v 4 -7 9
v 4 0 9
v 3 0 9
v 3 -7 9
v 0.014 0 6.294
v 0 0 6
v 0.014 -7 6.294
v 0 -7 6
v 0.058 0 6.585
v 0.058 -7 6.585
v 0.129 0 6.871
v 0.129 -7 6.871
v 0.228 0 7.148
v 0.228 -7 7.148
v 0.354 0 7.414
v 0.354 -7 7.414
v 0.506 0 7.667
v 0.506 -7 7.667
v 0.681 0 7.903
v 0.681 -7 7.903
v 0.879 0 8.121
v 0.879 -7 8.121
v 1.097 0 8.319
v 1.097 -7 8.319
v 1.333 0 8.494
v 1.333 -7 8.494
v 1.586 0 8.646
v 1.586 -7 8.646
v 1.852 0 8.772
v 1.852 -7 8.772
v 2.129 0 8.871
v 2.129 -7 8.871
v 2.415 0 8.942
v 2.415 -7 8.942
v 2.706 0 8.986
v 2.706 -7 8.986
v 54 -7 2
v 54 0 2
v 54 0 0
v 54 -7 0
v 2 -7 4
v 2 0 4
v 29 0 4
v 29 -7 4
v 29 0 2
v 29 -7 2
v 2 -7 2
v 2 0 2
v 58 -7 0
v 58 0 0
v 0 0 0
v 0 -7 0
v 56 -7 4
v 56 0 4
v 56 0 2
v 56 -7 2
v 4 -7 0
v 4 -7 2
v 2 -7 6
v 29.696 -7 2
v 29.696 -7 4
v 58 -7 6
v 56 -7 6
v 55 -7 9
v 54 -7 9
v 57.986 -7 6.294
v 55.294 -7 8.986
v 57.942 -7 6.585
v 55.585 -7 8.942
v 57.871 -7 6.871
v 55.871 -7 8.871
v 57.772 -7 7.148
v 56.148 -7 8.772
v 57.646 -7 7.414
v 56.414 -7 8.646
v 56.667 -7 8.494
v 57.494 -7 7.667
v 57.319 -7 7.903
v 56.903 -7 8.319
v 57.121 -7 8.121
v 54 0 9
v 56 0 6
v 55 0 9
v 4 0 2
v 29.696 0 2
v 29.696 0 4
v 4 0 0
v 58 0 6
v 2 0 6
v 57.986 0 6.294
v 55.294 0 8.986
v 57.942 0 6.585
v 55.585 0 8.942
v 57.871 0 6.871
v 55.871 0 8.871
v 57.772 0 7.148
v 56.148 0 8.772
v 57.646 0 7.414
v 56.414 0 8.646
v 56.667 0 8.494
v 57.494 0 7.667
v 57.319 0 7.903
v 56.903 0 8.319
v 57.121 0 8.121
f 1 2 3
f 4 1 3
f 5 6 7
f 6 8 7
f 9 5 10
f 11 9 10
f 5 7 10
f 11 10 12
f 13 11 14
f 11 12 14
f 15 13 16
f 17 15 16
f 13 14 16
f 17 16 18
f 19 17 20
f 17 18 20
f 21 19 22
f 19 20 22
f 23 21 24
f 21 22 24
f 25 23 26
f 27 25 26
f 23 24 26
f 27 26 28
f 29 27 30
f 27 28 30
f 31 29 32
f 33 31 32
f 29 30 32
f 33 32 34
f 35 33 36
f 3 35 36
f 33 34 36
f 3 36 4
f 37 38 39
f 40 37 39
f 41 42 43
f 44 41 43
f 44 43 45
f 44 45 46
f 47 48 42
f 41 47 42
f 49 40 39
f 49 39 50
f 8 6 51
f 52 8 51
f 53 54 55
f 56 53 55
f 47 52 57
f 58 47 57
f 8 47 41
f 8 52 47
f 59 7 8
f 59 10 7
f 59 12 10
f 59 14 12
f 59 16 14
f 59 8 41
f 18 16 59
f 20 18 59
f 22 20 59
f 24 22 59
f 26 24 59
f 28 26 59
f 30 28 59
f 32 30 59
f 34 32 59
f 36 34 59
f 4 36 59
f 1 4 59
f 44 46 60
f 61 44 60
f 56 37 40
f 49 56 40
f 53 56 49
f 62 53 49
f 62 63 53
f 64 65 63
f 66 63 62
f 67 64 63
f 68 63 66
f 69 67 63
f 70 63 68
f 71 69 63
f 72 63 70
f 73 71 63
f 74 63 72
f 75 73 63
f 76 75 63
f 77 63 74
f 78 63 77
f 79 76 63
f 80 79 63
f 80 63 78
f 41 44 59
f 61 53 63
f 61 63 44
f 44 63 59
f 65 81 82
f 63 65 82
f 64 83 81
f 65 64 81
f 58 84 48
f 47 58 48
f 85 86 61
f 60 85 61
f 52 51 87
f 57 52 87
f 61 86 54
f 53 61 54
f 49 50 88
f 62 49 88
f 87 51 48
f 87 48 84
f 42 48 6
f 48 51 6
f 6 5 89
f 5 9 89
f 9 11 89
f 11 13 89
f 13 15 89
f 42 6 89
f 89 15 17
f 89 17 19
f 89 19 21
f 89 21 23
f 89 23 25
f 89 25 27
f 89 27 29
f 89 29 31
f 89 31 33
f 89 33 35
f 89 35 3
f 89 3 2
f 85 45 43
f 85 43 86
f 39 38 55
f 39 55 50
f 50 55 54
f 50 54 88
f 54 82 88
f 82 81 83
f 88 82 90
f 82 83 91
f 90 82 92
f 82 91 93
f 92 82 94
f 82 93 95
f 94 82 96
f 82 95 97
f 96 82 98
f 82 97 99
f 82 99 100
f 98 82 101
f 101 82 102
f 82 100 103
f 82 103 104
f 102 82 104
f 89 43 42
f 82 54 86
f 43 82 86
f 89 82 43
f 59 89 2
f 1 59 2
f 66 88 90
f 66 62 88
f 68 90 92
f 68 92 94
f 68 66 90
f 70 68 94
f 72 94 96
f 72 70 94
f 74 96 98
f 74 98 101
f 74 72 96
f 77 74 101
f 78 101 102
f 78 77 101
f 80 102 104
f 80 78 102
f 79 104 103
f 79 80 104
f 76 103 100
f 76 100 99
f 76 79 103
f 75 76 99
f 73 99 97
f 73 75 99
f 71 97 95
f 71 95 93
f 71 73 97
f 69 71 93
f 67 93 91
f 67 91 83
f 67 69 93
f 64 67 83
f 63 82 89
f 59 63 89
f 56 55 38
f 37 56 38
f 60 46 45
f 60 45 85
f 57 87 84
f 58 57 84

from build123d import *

# Parameters (mm, degrees)
F1_DEPTH = 7
F2_R     = 3
F3_W     = 0.695917
F3_H     = 7
F4_DEPTH = 2


with BuildPart() as f1:
    # F0 (on Front) → F1 (new body)
    with BuildSketch(Plane.XZ):
        Polygon((0, 9), (0, 6), (2, 6), (4, 9), align=None)
        Polygon((2, 6), (0, 6), (0, 0), (4, 0), (4, 2), (2, 2), (2, 4), (56, 4), (56, 2), (54, 2), (54, 0), (58, 0), (58, 6), (56, 6), align=None)
        Polygon((54, 9), (56, 6), (58, 6), (58, 9), align=None)
    extrude(amount=F1_DEPTH)

    # F2
    f2_edges = [f1.edges().sort_by_distance(p)[0] for p in [
        (0, -3.5, 9),
        (58, -3.5, 9),
    ]]
    fillet(f2_edges, radius=F2_R)

    # F3 (on face) → F4 (join)
    with BuildSketch(Plane(origin=(0, 0, 4), x_dir=(1, 0, 0), z_dir=(0, 0, -1))):
        with Locations((29.347958, 3.5)):
            Rectangle(F3_W, F3_H)
    extrude(amount=F4_DEPTH)


solid = f1.part
